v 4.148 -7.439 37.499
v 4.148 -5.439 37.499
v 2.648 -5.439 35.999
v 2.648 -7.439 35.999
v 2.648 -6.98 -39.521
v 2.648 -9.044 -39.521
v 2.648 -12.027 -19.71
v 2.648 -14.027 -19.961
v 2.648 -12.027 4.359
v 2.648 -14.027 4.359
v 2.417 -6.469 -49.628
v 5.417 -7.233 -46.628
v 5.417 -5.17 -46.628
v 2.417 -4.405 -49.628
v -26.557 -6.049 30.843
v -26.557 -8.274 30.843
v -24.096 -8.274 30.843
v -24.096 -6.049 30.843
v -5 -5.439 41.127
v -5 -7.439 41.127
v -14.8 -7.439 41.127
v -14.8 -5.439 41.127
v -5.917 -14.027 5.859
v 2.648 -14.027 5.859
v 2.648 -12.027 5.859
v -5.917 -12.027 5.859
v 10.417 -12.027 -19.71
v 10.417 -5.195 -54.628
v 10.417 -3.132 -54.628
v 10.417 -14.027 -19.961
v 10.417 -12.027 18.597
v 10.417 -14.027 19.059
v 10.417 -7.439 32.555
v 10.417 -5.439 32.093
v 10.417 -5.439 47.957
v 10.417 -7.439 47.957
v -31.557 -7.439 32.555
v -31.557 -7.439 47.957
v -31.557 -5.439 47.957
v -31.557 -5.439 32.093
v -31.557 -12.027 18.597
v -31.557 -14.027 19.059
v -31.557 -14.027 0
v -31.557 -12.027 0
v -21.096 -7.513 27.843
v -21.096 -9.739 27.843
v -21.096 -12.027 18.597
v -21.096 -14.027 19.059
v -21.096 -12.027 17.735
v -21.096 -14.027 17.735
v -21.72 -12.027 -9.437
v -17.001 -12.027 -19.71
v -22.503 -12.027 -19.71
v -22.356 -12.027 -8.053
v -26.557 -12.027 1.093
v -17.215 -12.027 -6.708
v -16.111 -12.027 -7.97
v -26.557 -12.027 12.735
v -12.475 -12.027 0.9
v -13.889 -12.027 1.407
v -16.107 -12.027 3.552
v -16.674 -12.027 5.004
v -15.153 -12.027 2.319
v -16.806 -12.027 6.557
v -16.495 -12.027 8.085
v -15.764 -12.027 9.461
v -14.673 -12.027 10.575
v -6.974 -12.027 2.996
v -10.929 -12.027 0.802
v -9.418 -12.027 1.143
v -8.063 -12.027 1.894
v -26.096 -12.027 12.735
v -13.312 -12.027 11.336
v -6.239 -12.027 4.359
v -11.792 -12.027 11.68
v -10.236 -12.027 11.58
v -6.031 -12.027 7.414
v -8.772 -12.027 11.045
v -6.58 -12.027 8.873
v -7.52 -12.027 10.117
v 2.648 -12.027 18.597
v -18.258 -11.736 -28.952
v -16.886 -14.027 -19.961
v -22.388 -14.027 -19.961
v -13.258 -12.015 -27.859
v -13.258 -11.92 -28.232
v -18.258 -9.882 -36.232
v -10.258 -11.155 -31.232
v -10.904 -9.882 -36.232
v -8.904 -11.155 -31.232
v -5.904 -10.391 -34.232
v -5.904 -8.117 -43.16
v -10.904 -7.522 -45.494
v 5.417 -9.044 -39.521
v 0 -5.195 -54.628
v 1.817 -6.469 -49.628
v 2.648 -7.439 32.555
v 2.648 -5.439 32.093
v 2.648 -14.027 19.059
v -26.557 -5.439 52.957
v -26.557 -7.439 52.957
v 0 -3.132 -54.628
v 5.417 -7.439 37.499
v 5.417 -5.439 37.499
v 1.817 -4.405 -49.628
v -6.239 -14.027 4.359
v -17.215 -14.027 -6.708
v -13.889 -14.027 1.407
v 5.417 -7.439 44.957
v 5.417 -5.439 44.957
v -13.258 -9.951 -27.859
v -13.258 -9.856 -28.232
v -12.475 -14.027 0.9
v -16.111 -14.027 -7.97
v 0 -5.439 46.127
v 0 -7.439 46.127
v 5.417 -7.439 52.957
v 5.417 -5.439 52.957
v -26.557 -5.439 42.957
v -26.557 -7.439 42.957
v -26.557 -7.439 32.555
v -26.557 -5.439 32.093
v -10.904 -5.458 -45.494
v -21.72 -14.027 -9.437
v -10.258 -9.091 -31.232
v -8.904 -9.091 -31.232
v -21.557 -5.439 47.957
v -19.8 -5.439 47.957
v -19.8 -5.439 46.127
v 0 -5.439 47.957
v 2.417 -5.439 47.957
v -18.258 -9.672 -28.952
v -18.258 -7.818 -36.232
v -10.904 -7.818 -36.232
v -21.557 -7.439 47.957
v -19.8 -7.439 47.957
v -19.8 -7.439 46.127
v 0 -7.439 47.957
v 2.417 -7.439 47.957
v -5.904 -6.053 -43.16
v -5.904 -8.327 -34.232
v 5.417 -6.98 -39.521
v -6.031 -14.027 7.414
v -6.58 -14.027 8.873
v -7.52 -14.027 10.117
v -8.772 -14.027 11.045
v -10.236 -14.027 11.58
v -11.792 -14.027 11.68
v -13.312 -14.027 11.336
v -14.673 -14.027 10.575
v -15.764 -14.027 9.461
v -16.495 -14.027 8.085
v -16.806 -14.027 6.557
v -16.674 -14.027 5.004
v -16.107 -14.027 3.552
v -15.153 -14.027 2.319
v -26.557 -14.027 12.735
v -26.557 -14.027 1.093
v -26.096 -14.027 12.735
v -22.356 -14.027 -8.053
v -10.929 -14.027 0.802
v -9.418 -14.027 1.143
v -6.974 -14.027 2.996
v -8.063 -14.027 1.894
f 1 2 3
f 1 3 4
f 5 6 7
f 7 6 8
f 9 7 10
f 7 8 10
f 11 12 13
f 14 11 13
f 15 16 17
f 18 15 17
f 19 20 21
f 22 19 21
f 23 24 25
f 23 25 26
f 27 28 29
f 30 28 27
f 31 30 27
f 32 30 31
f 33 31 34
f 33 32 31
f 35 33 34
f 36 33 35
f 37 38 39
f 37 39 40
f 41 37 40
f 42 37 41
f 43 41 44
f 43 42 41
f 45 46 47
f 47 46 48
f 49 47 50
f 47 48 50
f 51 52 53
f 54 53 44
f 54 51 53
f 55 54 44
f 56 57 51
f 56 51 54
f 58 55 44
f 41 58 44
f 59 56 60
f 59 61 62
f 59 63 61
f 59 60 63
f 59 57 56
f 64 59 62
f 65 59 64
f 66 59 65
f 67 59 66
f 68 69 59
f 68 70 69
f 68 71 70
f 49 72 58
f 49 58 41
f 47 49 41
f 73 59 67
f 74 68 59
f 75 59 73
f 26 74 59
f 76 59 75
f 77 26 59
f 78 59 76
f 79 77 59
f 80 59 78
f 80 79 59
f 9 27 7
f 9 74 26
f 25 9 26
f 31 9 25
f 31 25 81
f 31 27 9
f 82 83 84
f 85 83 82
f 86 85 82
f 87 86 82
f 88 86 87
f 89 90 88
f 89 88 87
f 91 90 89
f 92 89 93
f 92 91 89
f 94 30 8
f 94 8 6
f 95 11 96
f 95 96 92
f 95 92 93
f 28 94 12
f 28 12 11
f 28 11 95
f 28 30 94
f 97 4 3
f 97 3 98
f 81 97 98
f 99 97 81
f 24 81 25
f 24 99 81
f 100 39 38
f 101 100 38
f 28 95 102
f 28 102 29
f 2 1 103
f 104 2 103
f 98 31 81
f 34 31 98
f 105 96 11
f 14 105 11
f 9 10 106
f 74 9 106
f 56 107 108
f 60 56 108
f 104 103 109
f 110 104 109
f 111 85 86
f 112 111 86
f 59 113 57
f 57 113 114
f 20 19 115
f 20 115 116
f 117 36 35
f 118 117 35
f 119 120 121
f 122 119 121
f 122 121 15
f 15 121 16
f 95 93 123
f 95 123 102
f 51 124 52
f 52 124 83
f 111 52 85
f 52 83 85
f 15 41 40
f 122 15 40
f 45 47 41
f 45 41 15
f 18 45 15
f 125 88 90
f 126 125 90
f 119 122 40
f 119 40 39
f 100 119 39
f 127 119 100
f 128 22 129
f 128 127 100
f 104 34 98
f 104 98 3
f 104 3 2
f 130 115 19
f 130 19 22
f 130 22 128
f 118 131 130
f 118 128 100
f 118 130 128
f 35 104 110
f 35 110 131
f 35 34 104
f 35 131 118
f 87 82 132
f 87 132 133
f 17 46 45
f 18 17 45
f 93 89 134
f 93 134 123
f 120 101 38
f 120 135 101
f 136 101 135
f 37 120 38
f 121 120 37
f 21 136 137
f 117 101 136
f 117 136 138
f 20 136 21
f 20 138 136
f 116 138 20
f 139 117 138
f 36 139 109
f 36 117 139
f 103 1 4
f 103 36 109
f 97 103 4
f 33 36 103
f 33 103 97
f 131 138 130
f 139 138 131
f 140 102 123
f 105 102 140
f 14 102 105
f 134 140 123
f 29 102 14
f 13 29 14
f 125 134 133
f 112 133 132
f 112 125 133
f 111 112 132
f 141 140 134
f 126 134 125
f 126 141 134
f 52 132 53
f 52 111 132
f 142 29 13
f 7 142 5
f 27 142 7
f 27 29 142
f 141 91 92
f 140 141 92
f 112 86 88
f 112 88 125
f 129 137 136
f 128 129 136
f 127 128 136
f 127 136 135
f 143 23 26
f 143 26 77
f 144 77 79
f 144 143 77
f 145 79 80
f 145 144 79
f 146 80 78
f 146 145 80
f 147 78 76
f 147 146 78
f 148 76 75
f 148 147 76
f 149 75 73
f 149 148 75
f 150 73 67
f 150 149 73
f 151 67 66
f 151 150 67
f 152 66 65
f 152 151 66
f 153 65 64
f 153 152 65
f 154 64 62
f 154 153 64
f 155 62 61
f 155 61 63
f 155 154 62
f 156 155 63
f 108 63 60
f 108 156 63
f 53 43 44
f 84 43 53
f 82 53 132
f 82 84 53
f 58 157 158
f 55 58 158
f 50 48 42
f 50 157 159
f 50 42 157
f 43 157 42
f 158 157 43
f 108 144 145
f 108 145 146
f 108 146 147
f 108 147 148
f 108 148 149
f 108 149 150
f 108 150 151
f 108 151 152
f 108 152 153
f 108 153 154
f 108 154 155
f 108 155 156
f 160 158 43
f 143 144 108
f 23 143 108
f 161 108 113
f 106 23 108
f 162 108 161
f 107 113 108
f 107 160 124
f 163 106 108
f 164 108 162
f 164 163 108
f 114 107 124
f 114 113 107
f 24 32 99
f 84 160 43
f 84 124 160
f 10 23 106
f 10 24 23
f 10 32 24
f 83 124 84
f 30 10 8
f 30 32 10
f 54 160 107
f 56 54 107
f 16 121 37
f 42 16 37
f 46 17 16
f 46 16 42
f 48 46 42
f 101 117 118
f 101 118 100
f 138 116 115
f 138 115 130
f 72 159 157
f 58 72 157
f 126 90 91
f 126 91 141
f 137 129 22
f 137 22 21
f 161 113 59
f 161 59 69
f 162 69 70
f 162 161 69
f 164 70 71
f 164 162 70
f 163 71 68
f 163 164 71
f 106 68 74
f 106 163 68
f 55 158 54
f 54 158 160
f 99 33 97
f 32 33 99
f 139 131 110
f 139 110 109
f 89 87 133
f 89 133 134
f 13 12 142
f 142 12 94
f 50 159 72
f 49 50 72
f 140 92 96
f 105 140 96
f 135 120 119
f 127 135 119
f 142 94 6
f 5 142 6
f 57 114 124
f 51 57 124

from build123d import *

# Parameters (mm, degrees)
F1_DEPTH = 25.4
F3_DEPTH = 30
F4_DEPTH = 30
F7_DEPTH = 25
F9_DEPTH = 40
F11_SIZE = 5
F12_SIZE = 3
F13_SIZE = 1.5


# Not quite as in the source:
# - a feature of the source that left no trace in its solid (it failed there, or was rolled back) is left out


with BuildPart() as f1:
    # F0 (on Front) → F1 (new body)
    with BuildSketch(Plane.XZ):
        Polygon((10.4166865349, 52.9566034675), (-31.557098031, 52.9566034675), (-31.557098031, 0), (-18.2580947876, -28.9524644613), (-18.2580947876, -36.2323522568), (-10.9038203955, -36.2323522568), (-10.9038203955, -45.4944968224), (0, -54.6278357506), (10.4166865349, -54.6278357506), align=None)
    extrude(amount=F1_DEPTH)


with BuildPart() as f3:
    # F2 (on Front) → F3 (new body, symmetric)
    with BuildSketch(Plane.XZ):
        with BuildLine():
            Line((-19.7998397052, 47.9566034675), (-26.557098031, 47.9566034675))
            Line((-26.557098031, 47.9566034675), (-26.557098031, 30.8428518474))
            Line((-26.557098031, 30.8428518474), (-21.0963413119, 30.8428518474))
            Line((-21.0963413119, 30.8428518474), (-21.0963413119, 12.7346292138))
            Line((-21.0963413119, 12.7346292138), (-26.557098031, 12.7346292138))
            Line((-26.557098031, 12.7346292138), (-26.557098031, 1.0934300149))
            Line((-26.557098031, 1.0934300149), (-22.3559527725, -8.0526320297))
            Line((-22.3559527725, -8.0526320297), (-17.2149640966, -6.7084824335))
            Line((-17.2149640966, -6.7084824335), (-13.8887305603, 1.4067513807))
            ThreePointArc((-13.8887305603, 1.4067513807), (-14.1854089296, 10.908286), (-5.9038203955, 6.2411166728))
            ThreePointArc((-5.9038203955, 6.2411166728), (-5.9071677422, 6.0500291804), (-5.9172056749, 5.8591761626))
            Line((-5.9172056749, 5.8591761626), (2.6482306421, 5.8591761626))
            Line((2.6482306421, 5.8591761626), (2.6482306421, 37.4990403652))
            Line((2.6482306421, 37.4990403652), (5.4166865349, 37.4990403652))
            Line((5.4166865349, 37.4990403652), (5.4166865349, 47.9566034675))
            Line((5.4166865349, 47.9566034675), (0, 47.9566034675))
            Line((0, 47.9566034675), (0, 41.127063334))
            Line((0, 41.127063334), (-19.7998397052, 41.127063334))
            Line((-19.7998397052, 41.127063334), (-19.7998397052, 47.9566034675))
        make_face()
    extrude(amount=F3_DEPTH, both=True)


with BuildPart() as f4:
    # F2 (on Front) → F4 (new body, symmetric)
    with BuildSketch(Plane.XZ):
        with BuildLine():
            Line((-16.1110319639, -7.9702737021), (-21.7201422185, -9.4368171549))
            Line((-21.7201422185, -9.4368171549), (-13.2580947876, -27.8590344464))
            Line((-13.2580947876, -27.8590344464), (-13.2580947876, -31.2323522568))
            Line((-13.2580947876, -31.2323522568), (-5.9038203955, -31.2323522568))
            Line((-5.9038203955, -31.2323522568), (-5.9038203955, -43.1603266307))
            Line((-5.9038203955, -43.1603266307), (1.8174038362, -49.6278357506))
            Line((1.8174038362, -49.6278357506), (5.4166865349, -49.6278357506))
            Line((5.4166865349, -49.6278357506), (5.4166865349, -39.5213142037))
            Line((5.4166865349, -39.5213142037), (2.6482306421, -39.5213142037))
            Line((2.6482306421, -39.5213142037), (2.6482306421, 4.3591761626))
            Line((2.6482306421, 4.3591761626), (-6.238670659, 4.3591761626))
            ThreePointArc((-6.238670659, 4.3591761626), (-8.7135994884, 1.4698551421), (-12.4751443179, 0.900443897))
            Line((-12.4751443179, 0.900443897), (-16.1110319639, -7.9702737021))
        make_face()
    extrude(amount=F4_DEPTH, both=True)


with BuildPart() as f1_1:
    add(f1.part)

    # F5: cut F3
    add(f3.part, mode=Mode.SUBTRACT)

    # F6: cut F4
    add(f4.part, mode=Mode.SUBTRACT)

    # F7 (add): a face of the model
    f7_faces = [f1_1.faces().sort_by_distance(p)[0] for p in [
        (-7.5880887423, 0, 6.6814576026),
    ]]
    extrude(f7_faces, amount=F7_DEPTH)


with BuildPart() as f9:
    # F8 (on Right) → F9 (new body, symmetric)
    with BuildSketch(Plane.YZ):
        Polygon((-5.4386107326, 32.0926371886), (-5.4386107326, 63.2104203105), (-7.4386107326, 63.2104203105), (-7.4386107326, 32.5547352223), (-14.0266608968, 19.0589928517), (-14.0266608968, -19.9610399589), (-3.9184388004, -59.6407970668), (-1.9803369667, -59.1470751993), (-12.0266608968, -19.7102989226), (-12.0266608968, 18.596894818), align=None)
    extrude(amount=F9_DEPTH, both=True)


with BuildPart() as f1_2:
    add(f1_1.part)

    # F10: intersect F9
    add(f9.part, mode=Mode.INTERSECT)

    # F11
    f11_edges = [f1_2.edges().sort_by_distance(p)[0] for p in [
        (-26.557098, -6.438611, 47.956603),
        (10.416687, -6.438611, 52.956603),
        (-31.557098, -6.438611, 52.956603),
        (0, -6.438611, 41.127063),
        (-19.79984, -6.438611, 41.127063),
        (-21.096341, -13.026661, 12.734629),
    ]]
    chamfer(f11_edges, length=F11_SIZE)

    # F12
    f12_edges = [f1_2.edges().sort_by_distance(p)[0] for p in [
        (5.416687, -6.438611, 47.956603),
        (-21.096341, -7.161491, 30.842852),
        (5.416687, -5.437254, -49.627836),
        (-5.90382, -10.123412, -31.232352),
        (-13.258095, -10.123412, -31.232352),
    ]]
    chamfer(f12_edges, length=F12_SIZE)

    # F13
    f13_edges = [f1_2.edges().sort_by_distance(p)[0] for p in [
        (2.648231, -6.438611, 37.49904),
    ]]
    chamfer(f13_edges, length=F13_SIZE)


solid = f1_2.part
